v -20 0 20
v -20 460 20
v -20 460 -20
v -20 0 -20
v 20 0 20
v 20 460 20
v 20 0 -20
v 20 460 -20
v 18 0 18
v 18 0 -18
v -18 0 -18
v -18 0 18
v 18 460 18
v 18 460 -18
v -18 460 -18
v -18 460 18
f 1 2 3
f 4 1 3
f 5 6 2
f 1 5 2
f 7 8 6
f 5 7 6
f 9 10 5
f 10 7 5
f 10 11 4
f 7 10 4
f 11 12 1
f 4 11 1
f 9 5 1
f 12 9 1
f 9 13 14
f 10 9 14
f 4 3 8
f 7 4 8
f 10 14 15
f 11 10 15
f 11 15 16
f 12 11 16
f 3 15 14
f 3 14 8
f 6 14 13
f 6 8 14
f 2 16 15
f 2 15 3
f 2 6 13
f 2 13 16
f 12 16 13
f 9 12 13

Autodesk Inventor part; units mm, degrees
ref_plane "YZ Plane" through (0, 0, 0) normal (1, 0, 0) x (0, 1, 0)
ref_plane "XZ Plane" through (0, 0, 0) normal (0, 1, 0) x (-1, 0, 0)
ref_plane "XY Plane" through (0, 0, 0) normal (0, 0, 1) x (1, 0, 0)
sketch "Sketch1" plane through (0, 0, 0) normal (0, 1, 0) x (-1, 0, 0)
  line L0 (-20, 20) -> (20, 20)
  line L1 (20, 20) -> (20, -20)
  line L2 (20, -20) -> (-20, -20)
  line L3 (-20, -20) -> (-20, 20)
  line L4 (-20, 20) -> (20, -20) construction
  line L5 (20, 20) -> (-20, -20) construction
  line L6 (18, 18) -> (-18, 18)
  line L7 (-18, 18) -> (-18, -18)
  line L8 (-18, -18) -> (18, -18)
  line L9 (18, -18) -> (18, 18)
  point P0 (0, 0)
  dimension "d19" = 40
  dimension "d20" = 40
  dimension "d21" = 2
extrude "Extrusion1" add sketch "Sketch1" along normal blind 460
equation "\"BendRadius\" = Thickness"
equation "\"BendReliefWidth\" = Thickness"
equation "\"BendReliefDepth\" = 0.5 * Thickness"
equation "\"TransitionRadius\" = BendRadius"
equation "\"JacobiRadiusSize\" = BendRadius"
equation "\"GapSize\" = Thickness"
equation "\"Thickness\" = 15"
properties part number "ДМФ 033 держатель лотка v2.0"
